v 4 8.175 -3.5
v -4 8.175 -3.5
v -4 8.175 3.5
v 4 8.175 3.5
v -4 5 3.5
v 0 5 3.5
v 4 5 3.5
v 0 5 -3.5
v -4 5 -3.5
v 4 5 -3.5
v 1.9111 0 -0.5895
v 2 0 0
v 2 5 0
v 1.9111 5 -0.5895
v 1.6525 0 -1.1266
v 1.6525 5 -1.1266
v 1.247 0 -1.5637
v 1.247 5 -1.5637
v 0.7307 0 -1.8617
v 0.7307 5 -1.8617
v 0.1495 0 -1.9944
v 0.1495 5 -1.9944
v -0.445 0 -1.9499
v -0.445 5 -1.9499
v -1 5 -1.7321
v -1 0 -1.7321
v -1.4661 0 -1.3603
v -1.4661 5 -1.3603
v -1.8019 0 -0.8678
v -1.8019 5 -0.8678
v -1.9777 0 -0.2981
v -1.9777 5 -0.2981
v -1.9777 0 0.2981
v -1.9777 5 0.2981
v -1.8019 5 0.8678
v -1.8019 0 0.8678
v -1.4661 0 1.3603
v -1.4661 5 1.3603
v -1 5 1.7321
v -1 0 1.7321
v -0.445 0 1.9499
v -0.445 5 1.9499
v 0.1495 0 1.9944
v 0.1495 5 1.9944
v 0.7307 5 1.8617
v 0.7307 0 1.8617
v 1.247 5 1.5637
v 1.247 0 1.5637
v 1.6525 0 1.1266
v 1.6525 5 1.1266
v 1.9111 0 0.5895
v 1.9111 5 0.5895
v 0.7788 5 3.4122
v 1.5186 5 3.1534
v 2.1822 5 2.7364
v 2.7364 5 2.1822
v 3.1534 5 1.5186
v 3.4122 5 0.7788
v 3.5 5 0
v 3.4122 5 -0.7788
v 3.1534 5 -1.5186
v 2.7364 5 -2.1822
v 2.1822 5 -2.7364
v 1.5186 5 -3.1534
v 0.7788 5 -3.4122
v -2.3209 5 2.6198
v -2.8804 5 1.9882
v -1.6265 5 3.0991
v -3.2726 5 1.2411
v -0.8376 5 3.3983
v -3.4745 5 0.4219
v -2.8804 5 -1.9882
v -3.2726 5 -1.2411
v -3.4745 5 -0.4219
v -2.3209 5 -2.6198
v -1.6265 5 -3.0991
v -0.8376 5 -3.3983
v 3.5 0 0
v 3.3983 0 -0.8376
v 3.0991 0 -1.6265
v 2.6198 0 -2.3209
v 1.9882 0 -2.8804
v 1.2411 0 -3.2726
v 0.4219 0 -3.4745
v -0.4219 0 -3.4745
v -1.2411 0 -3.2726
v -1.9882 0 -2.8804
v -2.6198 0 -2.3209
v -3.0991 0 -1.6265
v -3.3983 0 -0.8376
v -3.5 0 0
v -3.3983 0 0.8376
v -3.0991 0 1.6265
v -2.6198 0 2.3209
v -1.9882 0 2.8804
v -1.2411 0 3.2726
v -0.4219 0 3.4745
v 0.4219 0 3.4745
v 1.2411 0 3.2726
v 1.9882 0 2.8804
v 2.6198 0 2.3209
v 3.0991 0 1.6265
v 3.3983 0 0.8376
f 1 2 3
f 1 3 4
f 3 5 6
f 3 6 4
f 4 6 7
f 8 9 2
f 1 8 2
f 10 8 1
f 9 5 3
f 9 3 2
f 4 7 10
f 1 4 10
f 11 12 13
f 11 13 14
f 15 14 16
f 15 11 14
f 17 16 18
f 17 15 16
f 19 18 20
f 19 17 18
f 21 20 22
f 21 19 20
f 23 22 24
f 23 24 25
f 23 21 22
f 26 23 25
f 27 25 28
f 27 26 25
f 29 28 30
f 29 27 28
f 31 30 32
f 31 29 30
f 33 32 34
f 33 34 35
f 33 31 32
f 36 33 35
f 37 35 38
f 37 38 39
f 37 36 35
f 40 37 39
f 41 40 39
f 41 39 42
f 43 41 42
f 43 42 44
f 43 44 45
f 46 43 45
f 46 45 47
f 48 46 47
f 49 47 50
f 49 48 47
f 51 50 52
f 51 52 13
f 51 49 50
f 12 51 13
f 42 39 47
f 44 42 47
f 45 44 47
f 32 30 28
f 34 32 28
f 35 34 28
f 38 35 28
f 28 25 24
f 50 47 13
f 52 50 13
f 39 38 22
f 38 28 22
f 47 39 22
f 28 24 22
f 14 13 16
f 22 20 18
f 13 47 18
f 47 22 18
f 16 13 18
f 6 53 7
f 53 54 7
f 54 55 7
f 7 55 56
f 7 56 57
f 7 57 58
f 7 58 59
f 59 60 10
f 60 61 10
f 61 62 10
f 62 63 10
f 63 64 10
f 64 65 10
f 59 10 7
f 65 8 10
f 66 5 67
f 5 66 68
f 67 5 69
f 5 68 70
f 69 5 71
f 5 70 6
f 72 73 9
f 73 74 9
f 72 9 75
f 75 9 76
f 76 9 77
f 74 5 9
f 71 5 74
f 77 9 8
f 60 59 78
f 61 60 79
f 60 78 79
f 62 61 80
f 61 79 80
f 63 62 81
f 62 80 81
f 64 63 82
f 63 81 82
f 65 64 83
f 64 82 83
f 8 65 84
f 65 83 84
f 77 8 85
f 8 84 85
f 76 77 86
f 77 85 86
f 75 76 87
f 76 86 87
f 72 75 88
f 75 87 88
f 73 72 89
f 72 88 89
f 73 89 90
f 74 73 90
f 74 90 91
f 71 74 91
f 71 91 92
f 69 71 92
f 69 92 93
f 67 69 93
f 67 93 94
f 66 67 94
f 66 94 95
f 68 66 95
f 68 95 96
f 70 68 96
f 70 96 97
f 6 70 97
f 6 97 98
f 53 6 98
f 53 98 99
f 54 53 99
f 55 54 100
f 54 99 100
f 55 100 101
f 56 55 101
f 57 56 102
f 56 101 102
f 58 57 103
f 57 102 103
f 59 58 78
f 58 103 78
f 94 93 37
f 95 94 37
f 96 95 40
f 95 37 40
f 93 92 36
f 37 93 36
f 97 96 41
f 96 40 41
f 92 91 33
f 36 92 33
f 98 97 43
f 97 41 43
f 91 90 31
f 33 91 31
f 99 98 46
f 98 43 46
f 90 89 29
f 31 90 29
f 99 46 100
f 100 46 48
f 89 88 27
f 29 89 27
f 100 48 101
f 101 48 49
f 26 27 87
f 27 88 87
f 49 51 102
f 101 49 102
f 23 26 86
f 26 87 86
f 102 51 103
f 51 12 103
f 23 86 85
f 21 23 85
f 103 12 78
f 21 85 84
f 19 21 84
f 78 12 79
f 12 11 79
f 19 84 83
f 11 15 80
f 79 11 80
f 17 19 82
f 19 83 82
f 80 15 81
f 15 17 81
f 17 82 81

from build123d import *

# Parameters (mm, degrees)
SKETCH1_R           = 3.5
SKETCH1_R_2         = 2
BOSS_EXTRUDE1_DEPTH = 5
SKETCH2_W           = 8
SKETCH2_H           = 7
BOSS_EXTRUDE2_DEPTH = 3.175


with BuildPart() as part:
    # Sketch1 → Boss-Extrude1 (new body)
    with BuildSketch(Plane(origin=(0, 0, 0), x_dir=(1, 0, 0), z_dir=(0, 1, 0))):
        Circle(SKETCH1_R)
        Circle(SKETCH1_R_2, mode=Mode.SUBTRACT)
    extrude(amount=BOSS_EXTRUDE1_DEPTH)

    # Sketch2 → Boss-Extrude2 (add)
    with BuildSketch(Plane(origin=(0, 5, 0), x_dir=(1, 0, 0), z_dir=(0, 1, 0))):
        Rectangle(SKETCH2_W, SKETCH2_H)
    extrude(amount=BOSS_EXTRUDE2_DEPTH)


solid = part.part
